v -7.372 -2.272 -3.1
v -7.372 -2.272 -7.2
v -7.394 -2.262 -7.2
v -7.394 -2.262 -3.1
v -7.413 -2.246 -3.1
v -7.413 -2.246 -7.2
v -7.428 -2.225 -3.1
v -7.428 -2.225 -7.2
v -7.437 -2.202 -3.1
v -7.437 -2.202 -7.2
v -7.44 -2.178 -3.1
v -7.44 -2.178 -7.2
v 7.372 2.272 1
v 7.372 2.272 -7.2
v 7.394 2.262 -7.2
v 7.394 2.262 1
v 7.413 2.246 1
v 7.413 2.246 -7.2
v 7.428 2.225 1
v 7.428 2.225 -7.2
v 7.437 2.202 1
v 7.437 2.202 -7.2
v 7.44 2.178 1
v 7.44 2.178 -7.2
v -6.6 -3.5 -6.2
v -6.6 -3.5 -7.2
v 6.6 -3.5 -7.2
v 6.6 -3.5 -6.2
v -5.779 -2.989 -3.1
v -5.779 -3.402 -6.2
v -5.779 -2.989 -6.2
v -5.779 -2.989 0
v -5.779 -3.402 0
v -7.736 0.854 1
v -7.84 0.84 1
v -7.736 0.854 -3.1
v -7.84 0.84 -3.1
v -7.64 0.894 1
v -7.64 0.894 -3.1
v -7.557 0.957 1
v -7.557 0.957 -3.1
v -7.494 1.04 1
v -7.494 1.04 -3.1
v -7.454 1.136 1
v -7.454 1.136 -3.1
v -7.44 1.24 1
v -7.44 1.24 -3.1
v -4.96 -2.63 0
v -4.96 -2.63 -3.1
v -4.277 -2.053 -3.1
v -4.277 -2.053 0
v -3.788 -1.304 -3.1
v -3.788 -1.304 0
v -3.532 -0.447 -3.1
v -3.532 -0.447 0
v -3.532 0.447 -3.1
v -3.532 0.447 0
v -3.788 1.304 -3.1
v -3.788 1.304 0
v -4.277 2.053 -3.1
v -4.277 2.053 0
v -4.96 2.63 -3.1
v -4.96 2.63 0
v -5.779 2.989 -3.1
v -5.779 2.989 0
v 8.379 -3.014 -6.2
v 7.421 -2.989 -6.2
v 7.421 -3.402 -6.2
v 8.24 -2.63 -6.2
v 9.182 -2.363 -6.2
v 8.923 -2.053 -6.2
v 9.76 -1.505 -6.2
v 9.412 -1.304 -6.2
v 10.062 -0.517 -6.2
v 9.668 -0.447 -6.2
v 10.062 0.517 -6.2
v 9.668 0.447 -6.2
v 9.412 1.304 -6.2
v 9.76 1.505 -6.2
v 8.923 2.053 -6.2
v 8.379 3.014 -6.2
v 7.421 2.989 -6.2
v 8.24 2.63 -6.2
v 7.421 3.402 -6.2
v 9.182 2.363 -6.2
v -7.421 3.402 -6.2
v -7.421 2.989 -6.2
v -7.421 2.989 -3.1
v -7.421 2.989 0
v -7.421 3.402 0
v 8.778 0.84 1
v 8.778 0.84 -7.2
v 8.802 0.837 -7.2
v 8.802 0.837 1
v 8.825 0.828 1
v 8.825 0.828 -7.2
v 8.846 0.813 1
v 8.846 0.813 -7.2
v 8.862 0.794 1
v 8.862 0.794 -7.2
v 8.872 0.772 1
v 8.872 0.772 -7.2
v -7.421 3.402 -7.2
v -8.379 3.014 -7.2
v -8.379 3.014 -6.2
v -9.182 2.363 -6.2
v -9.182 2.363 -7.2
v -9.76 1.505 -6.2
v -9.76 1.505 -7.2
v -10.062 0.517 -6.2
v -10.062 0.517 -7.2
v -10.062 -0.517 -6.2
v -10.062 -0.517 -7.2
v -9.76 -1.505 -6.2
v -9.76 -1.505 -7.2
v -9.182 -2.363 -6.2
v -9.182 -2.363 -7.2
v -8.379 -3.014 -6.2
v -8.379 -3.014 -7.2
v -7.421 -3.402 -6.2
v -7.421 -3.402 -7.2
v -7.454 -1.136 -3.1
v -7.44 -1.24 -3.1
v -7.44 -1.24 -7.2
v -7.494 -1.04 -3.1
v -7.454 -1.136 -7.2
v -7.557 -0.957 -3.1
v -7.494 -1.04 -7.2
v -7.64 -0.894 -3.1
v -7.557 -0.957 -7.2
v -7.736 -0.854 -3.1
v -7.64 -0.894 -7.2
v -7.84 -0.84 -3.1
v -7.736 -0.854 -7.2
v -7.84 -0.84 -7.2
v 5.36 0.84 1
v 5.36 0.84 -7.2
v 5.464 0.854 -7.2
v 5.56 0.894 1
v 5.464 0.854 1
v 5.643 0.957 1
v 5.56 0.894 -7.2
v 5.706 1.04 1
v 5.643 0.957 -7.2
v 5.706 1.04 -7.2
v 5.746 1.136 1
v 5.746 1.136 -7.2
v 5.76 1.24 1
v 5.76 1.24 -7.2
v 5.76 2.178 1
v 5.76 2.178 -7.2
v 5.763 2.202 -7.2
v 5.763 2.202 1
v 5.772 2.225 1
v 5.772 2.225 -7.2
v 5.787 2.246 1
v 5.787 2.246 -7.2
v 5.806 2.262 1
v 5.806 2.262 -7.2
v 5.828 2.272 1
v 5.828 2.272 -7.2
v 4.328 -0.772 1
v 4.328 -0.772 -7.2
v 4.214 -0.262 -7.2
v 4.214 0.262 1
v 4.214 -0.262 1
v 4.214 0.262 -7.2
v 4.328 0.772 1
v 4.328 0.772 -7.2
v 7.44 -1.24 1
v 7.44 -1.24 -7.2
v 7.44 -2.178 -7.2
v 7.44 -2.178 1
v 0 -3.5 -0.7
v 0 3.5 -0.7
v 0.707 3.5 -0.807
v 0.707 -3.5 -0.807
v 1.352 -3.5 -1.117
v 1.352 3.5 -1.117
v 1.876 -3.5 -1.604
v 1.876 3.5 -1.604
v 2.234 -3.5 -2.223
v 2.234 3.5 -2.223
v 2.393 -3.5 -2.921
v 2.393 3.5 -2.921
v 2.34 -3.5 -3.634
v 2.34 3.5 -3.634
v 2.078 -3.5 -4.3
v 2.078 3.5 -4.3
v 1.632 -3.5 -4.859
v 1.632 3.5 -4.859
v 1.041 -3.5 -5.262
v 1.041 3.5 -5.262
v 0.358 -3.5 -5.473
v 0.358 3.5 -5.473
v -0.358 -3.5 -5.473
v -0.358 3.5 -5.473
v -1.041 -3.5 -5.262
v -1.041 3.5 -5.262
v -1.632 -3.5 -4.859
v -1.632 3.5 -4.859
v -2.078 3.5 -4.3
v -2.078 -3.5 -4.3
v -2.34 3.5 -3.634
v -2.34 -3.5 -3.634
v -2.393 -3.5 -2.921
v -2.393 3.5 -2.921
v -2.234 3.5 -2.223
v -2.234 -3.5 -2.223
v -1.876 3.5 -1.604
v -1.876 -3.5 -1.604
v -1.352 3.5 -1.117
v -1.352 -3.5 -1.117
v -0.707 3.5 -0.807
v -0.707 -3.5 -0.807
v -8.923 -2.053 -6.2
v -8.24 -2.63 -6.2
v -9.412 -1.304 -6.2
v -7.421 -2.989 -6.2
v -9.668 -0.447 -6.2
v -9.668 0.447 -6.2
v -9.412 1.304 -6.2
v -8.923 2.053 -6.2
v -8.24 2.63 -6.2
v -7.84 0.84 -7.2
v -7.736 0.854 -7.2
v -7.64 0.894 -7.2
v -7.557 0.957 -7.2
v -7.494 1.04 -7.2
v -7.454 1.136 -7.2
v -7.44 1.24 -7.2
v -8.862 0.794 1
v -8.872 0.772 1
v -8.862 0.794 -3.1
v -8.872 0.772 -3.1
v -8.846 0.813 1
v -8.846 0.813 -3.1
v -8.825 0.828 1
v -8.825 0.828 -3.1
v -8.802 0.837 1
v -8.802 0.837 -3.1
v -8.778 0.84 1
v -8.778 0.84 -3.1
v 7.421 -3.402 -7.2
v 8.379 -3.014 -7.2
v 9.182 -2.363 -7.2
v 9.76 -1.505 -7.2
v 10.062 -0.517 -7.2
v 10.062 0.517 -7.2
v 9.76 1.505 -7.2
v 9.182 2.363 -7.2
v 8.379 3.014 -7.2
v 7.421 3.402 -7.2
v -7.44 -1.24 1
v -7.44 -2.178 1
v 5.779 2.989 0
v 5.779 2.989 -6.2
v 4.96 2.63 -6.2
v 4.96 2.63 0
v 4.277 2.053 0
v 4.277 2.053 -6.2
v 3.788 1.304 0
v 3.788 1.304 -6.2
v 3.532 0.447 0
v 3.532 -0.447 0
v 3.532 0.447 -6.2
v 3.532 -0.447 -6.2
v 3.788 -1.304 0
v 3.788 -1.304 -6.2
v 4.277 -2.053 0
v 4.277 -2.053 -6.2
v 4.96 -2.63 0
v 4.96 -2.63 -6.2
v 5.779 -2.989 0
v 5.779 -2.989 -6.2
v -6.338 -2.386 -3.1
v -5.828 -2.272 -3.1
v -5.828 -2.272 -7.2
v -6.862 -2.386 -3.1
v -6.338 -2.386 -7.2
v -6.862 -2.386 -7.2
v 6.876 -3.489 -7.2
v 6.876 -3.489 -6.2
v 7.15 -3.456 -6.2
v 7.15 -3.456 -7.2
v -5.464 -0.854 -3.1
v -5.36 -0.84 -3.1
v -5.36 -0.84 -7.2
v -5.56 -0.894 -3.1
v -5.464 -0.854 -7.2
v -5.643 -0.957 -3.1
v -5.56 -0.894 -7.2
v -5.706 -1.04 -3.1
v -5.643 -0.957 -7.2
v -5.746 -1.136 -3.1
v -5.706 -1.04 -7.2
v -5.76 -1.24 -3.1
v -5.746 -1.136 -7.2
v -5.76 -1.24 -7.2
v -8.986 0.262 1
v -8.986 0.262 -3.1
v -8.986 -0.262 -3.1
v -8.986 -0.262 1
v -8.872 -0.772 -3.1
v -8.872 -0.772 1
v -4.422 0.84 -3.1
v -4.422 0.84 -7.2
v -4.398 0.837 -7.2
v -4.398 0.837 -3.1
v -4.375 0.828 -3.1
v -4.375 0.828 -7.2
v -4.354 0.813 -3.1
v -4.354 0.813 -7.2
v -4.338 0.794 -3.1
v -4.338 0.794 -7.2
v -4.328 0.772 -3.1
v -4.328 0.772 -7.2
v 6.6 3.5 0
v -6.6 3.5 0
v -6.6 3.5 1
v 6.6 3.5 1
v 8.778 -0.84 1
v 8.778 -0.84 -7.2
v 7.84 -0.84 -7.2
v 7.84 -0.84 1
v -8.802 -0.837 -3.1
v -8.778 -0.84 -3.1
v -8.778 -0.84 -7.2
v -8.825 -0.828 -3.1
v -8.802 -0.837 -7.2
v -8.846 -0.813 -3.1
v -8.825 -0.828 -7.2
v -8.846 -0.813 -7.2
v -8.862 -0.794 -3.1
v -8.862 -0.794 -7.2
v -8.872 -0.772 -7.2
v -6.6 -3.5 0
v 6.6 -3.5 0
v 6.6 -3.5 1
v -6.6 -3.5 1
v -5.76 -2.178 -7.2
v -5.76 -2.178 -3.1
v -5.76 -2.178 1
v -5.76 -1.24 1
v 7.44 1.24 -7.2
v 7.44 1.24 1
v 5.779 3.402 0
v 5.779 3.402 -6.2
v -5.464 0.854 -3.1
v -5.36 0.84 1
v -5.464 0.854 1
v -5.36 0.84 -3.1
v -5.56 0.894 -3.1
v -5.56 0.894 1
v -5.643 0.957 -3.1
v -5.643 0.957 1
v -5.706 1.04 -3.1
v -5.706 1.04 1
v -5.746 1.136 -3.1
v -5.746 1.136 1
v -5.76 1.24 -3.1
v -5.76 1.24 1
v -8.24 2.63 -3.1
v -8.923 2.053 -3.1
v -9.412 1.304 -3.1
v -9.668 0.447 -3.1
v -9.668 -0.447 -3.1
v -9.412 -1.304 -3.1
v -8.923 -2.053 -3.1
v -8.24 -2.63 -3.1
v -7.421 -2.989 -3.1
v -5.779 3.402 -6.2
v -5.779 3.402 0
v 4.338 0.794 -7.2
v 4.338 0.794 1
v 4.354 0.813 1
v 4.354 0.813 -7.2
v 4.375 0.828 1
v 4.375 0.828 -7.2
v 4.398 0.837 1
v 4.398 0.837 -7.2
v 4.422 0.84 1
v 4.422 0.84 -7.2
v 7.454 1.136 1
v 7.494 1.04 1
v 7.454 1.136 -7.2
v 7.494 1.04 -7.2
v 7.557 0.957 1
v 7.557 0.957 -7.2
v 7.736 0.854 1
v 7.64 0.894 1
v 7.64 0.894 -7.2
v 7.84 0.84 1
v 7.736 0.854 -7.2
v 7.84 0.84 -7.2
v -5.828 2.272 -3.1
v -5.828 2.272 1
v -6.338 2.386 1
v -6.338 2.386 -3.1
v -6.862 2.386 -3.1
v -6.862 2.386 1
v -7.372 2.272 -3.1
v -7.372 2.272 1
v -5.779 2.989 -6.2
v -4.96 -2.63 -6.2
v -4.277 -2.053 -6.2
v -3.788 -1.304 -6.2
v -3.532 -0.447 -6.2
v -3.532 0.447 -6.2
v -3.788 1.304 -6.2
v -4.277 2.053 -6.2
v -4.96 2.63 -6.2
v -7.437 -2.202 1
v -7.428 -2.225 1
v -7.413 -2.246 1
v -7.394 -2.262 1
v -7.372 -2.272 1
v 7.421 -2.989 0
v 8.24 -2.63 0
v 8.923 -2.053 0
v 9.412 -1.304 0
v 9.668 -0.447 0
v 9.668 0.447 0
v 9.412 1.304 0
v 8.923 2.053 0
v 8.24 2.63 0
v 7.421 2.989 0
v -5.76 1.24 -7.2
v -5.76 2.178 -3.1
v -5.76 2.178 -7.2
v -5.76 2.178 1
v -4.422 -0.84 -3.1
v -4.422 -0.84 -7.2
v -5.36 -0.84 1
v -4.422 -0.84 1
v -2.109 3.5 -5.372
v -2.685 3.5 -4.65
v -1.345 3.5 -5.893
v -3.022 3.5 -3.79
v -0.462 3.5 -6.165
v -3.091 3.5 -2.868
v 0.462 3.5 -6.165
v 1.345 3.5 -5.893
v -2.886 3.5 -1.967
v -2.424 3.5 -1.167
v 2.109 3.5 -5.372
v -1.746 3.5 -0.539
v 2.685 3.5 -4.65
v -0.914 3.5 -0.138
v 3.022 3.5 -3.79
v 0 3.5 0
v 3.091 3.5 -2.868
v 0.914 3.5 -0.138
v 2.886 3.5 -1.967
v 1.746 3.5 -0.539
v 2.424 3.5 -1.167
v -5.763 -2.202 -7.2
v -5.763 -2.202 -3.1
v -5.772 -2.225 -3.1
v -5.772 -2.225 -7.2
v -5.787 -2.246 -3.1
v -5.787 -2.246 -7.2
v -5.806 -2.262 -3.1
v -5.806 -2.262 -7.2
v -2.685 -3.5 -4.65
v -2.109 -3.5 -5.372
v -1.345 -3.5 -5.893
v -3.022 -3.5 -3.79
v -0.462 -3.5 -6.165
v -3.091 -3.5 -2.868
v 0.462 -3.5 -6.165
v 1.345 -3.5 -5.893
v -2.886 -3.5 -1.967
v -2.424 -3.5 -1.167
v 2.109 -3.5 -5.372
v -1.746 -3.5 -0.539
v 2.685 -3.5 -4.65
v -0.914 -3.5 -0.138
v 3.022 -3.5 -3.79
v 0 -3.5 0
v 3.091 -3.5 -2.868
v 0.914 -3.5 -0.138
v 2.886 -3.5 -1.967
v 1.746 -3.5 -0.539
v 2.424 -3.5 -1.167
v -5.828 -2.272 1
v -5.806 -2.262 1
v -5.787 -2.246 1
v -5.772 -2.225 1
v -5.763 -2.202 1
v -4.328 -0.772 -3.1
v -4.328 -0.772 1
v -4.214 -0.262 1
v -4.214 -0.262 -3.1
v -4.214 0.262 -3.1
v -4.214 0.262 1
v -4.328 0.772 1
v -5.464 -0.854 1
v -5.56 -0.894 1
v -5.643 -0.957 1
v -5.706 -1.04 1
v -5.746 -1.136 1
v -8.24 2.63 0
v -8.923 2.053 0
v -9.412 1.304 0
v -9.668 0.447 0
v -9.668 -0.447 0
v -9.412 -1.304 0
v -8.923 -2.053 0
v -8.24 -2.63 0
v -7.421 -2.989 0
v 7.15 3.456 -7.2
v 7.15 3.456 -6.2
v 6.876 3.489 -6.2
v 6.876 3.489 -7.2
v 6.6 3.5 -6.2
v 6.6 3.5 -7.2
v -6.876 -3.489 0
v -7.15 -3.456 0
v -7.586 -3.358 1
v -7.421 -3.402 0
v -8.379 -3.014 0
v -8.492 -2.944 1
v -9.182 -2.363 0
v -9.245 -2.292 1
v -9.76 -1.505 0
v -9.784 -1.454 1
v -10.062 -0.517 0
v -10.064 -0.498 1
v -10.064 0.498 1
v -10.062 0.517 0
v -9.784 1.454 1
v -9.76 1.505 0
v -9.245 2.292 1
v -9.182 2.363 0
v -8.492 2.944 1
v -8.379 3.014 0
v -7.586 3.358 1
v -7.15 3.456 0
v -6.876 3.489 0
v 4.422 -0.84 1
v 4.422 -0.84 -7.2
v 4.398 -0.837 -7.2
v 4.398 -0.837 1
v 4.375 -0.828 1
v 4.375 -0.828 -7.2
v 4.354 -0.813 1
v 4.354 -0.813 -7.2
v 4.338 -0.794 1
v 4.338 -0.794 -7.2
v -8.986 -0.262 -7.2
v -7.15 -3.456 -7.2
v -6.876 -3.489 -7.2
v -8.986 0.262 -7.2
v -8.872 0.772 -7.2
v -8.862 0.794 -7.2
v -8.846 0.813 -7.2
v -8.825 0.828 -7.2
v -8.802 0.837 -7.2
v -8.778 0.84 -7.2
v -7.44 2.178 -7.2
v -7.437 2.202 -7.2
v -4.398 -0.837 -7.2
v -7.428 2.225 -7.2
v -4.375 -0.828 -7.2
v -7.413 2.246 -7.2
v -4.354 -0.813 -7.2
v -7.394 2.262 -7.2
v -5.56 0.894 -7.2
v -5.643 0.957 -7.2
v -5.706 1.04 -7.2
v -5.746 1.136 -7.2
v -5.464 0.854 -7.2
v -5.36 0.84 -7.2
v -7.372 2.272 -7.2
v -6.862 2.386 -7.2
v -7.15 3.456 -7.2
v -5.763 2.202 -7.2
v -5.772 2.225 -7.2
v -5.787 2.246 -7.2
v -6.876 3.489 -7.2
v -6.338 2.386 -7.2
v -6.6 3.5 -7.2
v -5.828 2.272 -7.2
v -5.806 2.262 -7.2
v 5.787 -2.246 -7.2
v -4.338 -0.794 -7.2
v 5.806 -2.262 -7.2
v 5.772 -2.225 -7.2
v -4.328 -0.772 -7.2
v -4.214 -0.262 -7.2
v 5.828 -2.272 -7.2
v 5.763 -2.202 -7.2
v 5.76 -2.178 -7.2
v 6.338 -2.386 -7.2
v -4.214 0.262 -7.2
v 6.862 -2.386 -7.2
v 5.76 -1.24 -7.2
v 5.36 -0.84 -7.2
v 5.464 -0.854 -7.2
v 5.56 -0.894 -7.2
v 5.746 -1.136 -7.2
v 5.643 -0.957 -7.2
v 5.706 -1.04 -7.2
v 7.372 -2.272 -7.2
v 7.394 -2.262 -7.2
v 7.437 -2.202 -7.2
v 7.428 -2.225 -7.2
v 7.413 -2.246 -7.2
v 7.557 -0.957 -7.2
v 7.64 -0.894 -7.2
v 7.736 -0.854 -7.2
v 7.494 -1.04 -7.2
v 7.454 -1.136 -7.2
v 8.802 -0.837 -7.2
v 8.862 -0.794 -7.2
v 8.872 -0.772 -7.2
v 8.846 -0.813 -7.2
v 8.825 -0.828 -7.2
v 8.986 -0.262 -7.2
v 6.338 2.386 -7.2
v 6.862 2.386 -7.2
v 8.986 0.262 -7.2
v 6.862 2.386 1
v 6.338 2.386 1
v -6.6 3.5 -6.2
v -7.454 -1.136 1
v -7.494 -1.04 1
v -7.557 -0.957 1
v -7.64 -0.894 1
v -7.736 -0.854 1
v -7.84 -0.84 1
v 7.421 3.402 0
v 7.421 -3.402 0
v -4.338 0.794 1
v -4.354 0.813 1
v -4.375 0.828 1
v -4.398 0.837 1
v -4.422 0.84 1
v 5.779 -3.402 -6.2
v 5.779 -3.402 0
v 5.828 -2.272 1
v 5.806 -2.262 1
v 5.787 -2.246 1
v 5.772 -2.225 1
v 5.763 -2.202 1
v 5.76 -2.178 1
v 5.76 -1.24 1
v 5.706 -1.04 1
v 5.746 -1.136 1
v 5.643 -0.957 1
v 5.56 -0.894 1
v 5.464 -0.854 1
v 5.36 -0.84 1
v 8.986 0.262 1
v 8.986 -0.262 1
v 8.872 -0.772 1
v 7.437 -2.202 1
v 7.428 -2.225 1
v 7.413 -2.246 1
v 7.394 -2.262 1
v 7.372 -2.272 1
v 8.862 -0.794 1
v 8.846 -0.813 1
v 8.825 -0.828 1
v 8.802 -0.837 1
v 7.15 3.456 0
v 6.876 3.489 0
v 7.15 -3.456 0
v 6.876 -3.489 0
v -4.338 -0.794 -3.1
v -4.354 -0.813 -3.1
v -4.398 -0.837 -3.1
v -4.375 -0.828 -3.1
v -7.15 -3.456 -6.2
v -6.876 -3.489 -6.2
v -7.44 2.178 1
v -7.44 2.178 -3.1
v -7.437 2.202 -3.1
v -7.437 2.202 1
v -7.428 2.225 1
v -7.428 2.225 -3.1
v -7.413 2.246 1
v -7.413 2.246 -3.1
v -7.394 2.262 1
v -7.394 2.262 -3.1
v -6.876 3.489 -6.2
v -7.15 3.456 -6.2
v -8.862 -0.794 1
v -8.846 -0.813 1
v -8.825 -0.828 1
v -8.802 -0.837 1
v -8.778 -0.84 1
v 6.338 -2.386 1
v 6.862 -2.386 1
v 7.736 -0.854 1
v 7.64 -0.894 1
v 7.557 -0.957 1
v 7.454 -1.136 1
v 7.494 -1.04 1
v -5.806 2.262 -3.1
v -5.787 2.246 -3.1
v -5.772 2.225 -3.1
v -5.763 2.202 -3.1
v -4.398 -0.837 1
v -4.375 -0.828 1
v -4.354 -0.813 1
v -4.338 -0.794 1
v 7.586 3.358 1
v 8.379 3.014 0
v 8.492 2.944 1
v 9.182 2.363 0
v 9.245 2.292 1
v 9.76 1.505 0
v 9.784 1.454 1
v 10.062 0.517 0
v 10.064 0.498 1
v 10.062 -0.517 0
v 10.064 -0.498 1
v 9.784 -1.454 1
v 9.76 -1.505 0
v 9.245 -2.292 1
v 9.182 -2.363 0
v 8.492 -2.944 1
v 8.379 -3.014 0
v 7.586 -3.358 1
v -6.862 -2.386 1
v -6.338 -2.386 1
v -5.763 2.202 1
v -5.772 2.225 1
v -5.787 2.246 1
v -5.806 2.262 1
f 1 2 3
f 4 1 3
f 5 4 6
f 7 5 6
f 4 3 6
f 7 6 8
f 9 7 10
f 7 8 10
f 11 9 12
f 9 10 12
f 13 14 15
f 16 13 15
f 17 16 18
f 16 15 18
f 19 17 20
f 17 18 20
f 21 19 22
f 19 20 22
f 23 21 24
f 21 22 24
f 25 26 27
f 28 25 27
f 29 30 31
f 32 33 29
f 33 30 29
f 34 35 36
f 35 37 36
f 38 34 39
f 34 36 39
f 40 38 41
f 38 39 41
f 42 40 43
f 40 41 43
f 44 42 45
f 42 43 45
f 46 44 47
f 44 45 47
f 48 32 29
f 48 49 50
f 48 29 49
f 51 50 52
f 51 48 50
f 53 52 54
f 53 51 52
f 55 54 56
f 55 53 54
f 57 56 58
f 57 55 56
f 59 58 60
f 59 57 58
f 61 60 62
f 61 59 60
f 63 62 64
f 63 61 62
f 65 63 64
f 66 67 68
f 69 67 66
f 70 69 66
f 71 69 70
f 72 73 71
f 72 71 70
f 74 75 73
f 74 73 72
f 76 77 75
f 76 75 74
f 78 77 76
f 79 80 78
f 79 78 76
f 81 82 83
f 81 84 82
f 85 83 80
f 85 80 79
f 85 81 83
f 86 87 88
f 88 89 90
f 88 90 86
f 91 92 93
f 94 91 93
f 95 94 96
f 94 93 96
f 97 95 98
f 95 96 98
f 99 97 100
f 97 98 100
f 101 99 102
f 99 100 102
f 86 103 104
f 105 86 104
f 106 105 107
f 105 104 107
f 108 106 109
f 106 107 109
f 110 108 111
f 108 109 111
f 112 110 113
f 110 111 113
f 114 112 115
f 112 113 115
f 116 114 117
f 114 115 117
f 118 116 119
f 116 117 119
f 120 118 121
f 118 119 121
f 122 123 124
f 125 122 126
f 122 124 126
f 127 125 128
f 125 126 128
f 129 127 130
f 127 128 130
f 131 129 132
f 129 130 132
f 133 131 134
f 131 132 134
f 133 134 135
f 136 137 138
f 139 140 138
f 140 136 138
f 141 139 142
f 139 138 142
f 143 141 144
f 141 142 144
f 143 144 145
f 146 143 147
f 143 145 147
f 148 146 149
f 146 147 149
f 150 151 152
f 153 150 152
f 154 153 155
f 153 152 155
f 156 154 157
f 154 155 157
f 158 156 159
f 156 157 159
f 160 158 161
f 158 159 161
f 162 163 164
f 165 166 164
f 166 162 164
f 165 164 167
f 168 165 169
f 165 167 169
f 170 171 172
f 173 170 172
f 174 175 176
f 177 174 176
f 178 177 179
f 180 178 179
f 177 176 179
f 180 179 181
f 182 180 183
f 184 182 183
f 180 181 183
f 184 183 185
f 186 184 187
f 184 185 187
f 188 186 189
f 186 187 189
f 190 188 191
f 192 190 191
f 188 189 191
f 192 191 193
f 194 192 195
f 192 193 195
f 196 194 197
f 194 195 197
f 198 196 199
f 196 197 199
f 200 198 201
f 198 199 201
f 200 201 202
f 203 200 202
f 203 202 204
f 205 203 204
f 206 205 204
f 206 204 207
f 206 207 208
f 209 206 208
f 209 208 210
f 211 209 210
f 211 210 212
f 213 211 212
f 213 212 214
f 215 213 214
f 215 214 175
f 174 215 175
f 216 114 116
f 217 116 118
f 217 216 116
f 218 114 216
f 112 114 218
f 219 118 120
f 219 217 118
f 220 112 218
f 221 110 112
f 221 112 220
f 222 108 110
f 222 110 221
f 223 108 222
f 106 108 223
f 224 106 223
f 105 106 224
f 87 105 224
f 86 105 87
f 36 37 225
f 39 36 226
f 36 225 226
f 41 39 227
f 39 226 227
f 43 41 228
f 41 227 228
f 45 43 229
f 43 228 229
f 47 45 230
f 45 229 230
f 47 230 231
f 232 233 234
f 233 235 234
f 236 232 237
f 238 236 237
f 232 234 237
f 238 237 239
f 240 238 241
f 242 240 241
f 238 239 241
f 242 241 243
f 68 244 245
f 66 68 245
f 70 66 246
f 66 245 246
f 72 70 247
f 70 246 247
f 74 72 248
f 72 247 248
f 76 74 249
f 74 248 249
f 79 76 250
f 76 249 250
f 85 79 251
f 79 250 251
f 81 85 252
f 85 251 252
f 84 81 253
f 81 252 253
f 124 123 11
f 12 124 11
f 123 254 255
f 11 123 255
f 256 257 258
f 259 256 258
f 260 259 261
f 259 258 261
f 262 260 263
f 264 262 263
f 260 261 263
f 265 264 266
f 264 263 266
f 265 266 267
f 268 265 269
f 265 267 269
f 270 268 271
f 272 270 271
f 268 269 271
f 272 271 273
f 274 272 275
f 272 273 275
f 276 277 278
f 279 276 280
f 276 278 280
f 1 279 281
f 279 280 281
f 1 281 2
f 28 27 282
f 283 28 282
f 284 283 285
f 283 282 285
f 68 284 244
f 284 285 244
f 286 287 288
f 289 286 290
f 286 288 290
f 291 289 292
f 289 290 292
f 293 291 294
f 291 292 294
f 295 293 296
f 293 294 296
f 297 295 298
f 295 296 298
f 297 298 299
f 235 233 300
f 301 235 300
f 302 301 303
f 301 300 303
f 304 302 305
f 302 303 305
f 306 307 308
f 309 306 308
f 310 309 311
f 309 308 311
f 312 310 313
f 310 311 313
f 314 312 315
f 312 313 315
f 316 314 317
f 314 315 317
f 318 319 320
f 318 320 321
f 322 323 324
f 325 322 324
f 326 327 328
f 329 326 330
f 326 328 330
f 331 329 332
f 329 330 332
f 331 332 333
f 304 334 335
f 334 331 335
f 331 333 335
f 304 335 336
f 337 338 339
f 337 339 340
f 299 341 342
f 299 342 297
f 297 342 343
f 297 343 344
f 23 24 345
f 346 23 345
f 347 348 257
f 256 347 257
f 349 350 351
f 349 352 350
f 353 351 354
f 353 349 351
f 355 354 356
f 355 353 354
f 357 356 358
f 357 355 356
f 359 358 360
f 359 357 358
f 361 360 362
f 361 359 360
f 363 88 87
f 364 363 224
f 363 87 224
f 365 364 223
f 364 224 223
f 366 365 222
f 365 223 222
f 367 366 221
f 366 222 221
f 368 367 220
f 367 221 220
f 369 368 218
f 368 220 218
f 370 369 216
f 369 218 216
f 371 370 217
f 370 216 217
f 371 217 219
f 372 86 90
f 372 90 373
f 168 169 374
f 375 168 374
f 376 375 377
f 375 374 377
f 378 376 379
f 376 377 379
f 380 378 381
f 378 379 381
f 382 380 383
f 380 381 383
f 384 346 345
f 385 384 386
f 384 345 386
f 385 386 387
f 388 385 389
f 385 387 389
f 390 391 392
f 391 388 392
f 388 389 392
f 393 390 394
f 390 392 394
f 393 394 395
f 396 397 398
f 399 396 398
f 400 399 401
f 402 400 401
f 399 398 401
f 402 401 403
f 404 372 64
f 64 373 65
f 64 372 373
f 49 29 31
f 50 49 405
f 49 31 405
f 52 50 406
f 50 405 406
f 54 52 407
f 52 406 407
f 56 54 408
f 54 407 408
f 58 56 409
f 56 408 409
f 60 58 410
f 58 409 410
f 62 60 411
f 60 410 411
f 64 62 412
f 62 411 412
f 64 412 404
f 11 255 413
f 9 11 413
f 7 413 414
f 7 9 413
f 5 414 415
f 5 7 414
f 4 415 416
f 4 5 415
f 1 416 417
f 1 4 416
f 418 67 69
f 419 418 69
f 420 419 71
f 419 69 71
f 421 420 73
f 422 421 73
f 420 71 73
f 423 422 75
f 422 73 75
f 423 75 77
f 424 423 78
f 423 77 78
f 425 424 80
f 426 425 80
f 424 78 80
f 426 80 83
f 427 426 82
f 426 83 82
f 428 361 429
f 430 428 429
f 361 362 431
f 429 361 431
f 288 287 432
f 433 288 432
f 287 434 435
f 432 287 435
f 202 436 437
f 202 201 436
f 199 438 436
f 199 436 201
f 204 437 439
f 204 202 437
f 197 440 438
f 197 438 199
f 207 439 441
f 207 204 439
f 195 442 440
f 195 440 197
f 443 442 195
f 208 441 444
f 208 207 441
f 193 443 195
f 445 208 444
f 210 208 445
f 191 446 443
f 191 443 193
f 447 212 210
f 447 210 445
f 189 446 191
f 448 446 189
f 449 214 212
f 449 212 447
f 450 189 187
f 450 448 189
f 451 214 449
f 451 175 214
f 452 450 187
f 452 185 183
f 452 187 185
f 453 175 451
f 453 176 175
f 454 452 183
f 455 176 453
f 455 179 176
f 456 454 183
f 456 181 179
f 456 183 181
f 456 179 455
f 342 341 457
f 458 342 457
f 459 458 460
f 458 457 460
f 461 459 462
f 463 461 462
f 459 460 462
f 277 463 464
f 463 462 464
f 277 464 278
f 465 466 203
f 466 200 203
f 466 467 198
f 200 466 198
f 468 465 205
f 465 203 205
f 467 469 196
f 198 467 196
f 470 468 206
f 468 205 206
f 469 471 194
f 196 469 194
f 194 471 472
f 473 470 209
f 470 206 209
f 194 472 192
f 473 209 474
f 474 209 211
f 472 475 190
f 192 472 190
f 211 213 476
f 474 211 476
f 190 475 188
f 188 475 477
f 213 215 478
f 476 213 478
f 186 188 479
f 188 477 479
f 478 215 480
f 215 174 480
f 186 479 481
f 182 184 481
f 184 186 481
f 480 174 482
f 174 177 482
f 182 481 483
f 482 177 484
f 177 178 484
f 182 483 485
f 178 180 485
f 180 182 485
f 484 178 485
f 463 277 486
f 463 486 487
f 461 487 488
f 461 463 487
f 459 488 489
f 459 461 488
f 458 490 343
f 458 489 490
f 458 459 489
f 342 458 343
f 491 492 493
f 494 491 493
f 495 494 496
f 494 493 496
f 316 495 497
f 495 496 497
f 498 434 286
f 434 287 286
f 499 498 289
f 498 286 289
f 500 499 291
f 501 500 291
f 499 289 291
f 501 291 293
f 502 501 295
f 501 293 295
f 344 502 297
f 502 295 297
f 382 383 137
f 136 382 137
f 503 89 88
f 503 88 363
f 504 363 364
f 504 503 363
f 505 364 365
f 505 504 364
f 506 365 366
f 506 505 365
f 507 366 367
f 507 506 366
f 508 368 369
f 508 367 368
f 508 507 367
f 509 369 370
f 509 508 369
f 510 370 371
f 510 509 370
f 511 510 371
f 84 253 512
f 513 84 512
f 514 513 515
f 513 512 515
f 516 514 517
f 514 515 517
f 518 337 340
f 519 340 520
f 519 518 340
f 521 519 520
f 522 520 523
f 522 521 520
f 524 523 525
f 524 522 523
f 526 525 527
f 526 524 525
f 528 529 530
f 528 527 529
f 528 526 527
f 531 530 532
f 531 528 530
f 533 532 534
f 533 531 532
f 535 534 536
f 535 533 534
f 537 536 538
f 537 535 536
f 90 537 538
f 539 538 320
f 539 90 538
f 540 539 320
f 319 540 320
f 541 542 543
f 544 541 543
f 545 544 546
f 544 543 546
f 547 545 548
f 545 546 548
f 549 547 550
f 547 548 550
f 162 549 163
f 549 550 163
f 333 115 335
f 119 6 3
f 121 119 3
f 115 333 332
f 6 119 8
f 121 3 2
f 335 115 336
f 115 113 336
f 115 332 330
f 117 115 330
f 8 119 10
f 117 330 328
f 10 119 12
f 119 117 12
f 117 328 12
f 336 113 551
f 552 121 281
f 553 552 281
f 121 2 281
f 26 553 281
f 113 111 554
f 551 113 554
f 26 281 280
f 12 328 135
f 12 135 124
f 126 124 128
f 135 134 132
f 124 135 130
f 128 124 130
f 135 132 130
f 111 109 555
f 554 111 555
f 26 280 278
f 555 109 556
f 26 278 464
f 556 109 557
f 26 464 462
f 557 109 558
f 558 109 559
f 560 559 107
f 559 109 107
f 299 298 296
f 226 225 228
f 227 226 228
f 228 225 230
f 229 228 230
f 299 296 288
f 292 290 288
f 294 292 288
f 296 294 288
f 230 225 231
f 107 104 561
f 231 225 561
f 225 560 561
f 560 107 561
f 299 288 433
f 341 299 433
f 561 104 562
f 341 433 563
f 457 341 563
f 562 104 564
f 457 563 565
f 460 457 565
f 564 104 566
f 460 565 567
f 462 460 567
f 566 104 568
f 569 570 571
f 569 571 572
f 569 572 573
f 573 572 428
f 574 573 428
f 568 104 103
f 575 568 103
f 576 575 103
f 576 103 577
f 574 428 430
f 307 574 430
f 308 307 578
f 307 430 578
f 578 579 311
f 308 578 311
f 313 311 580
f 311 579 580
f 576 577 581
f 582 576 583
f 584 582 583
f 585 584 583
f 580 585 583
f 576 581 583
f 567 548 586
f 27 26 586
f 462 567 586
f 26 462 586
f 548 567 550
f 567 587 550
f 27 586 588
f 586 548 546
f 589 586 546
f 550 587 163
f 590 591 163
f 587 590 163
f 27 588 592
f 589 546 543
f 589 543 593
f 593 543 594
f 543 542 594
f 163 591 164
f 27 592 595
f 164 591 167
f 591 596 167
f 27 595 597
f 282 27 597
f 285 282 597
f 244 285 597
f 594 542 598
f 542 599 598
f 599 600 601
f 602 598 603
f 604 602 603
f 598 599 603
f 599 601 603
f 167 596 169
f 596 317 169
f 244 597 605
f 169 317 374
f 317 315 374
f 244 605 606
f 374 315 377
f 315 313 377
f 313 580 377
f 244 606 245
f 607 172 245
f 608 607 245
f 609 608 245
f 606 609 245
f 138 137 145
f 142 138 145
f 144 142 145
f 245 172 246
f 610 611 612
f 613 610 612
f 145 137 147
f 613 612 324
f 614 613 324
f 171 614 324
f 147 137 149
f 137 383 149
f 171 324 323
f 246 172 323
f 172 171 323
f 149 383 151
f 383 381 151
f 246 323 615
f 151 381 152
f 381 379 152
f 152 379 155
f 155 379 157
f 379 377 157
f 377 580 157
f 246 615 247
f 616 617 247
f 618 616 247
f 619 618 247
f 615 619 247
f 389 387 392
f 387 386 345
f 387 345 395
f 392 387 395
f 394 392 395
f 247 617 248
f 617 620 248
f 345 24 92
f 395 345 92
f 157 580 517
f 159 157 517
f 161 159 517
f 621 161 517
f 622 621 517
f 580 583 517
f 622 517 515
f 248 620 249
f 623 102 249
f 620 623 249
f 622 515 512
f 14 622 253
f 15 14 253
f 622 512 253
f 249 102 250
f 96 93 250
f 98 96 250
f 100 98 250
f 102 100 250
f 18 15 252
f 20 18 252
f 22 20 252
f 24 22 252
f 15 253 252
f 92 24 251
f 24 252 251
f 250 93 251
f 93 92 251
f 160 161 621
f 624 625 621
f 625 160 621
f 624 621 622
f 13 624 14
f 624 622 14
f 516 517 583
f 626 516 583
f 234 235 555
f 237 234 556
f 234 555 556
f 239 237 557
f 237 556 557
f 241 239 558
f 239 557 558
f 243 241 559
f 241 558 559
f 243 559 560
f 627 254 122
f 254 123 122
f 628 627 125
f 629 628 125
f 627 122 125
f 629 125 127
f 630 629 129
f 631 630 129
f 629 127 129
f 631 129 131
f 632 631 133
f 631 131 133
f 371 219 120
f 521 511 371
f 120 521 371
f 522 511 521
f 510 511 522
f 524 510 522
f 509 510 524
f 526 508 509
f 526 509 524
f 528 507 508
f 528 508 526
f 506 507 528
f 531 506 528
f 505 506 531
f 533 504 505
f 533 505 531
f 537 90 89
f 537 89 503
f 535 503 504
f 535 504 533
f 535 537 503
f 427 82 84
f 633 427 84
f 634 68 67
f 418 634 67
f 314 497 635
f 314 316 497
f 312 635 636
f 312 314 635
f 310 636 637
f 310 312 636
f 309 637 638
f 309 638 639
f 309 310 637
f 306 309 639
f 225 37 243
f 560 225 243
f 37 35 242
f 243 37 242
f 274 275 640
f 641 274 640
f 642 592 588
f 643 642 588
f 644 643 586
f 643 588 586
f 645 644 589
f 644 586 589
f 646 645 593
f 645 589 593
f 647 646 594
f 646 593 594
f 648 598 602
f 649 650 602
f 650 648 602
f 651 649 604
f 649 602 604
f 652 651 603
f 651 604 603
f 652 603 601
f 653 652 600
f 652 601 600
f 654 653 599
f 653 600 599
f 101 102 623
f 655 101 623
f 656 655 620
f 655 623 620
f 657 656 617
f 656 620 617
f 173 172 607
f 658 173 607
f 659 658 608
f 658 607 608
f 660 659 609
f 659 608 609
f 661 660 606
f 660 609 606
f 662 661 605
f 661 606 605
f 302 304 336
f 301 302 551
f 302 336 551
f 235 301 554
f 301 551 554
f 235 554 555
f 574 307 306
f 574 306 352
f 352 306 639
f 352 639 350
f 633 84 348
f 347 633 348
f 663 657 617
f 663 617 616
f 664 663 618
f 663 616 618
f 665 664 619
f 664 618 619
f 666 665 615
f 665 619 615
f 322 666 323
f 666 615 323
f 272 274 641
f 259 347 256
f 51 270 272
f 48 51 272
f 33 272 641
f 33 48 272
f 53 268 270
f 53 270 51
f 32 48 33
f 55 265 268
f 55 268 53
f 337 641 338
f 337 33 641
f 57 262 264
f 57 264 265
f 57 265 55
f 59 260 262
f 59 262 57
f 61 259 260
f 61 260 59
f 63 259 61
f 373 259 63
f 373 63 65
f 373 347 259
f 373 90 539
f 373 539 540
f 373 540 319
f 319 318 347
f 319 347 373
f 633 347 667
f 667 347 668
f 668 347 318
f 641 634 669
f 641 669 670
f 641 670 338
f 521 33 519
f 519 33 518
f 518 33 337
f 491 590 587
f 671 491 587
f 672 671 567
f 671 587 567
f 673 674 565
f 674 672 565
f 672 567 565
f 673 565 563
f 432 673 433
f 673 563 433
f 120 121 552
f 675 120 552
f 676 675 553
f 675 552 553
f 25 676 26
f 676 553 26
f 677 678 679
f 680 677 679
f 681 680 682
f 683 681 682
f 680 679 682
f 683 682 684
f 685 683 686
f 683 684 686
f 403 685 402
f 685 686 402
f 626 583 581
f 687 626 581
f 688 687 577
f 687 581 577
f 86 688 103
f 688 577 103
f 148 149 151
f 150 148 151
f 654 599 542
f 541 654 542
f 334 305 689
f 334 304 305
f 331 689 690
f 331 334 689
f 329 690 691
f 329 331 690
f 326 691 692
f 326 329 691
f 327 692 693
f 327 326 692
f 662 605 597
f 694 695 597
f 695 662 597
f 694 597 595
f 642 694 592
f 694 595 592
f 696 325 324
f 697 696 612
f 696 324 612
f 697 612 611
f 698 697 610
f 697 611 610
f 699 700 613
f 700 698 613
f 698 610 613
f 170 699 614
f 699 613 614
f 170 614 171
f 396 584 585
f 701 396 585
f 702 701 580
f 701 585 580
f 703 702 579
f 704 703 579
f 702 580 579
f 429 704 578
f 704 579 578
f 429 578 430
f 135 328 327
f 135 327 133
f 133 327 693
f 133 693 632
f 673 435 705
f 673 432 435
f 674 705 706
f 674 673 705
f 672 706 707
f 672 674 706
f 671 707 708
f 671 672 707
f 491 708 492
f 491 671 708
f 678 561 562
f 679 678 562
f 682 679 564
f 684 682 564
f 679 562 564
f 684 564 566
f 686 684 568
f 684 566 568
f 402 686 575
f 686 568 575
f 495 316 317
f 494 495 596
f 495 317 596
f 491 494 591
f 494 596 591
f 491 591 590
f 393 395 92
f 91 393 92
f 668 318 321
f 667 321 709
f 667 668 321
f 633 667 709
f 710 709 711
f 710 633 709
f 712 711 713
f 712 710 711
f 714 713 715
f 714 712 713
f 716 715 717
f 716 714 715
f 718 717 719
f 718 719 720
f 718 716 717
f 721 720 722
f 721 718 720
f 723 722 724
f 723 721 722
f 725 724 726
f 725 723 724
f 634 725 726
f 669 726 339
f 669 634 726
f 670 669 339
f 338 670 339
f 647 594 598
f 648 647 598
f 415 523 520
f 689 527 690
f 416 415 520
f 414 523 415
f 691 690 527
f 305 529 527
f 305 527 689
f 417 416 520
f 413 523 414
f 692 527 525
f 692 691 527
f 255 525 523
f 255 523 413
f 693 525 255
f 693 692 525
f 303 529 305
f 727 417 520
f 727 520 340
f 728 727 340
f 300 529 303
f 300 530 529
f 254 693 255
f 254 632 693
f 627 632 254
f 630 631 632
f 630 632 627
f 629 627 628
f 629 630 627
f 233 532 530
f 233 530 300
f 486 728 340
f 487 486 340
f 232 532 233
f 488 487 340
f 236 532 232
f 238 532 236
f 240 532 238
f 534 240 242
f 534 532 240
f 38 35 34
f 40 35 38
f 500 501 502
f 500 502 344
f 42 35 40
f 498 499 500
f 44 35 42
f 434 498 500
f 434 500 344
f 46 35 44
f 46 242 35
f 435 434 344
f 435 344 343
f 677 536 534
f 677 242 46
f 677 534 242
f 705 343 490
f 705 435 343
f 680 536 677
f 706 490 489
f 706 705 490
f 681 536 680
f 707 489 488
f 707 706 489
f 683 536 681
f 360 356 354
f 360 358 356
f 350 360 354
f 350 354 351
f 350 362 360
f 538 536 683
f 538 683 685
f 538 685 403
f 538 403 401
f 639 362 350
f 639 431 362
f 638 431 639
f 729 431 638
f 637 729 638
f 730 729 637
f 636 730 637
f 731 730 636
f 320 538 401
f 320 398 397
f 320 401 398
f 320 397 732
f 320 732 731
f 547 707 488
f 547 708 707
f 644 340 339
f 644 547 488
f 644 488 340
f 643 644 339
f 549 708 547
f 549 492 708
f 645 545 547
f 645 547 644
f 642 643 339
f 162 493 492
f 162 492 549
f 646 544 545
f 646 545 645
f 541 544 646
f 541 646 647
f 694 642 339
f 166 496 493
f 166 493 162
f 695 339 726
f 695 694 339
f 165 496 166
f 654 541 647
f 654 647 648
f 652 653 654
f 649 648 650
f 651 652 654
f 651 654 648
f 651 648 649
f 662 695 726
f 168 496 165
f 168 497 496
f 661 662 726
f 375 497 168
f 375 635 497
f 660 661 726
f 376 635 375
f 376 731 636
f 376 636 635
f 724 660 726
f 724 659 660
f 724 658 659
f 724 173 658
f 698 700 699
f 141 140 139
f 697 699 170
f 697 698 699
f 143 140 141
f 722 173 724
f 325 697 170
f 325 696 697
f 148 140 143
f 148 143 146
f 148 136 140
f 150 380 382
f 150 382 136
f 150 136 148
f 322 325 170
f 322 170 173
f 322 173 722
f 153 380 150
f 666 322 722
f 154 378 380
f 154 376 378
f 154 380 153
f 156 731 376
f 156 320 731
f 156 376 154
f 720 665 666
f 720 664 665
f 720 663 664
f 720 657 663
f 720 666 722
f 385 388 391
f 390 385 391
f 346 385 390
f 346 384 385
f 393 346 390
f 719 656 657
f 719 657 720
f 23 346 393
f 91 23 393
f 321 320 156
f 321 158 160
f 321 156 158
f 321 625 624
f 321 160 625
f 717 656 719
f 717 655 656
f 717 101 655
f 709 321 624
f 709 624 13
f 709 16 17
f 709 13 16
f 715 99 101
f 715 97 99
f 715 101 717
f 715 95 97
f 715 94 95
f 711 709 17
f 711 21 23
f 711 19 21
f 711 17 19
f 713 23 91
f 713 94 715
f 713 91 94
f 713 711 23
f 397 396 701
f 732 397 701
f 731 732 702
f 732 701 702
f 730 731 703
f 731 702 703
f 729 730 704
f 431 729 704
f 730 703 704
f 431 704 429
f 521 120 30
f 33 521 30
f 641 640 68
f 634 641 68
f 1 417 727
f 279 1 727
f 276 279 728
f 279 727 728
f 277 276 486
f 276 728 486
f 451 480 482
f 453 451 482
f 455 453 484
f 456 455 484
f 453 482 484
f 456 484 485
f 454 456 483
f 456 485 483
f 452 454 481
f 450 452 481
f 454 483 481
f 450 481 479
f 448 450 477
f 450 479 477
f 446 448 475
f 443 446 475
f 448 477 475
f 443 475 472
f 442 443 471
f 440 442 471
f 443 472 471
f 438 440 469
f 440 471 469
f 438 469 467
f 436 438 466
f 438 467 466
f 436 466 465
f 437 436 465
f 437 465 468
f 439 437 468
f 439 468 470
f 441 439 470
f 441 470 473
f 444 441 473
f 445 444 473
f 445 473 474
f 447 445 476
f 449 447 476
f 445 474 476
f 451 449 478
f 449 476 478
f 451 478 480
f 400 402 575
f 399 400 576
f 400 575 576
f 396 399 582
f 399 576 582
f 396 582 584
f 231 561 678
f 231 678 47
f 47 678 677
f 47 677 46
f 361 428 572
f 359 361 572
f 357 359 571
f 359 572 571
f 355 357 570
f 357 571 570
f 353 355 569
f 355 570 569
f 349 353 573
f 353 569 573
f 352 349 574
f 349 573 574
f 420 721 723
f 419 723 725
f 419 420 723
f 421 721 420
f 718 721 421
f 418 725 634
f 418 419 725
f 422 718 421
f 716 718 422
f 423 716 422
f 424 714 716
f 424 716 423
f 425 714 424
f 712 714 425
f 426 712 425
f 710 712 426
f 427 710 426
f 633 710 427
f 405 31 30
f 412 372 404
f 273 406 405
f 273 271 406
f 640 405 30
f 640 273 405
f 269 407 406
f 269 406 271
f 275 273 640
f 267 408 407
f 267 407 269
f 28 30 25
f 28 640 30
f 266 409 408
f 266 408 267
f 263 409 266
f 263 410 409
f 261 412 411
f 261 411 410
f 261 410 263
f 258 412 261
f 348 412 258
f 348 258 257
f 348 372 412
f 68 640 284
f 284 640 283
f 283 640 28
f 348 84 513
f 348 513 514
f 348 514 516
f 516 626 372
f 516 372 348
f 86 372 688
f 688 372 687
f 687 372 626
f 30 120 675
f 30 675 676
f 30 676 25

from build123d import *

# Parameters (mm, degrees)
BOSS_EXTRUDE1_DEPTH      = 10
BOSS_EXTRUDE2_DEPTH      = 35
BOSS_EXTRUDE2_DEPTH_BACK = 35
SKETCH2_R                = 31
SKETCH3_R                = 31
BOSS_EXTRUDE3_DEPTH      = 41
CUT_EXTRUDE1_DEPTH       = 41
FILLET1_R                = 4
FILLET2_R                = 4
FILLET3_R                = 4
FILLET4_R                = 4
FILLET5_R                = 1
FILLET6_R                = 1
FILLET7_R                = 1
FILLET8_R                = 1
FILLET9_R                = 1
FILLET10_R               = 1
FILLET11_R               = 1
FILLET12_R               = 1
BOSS_EXTRUDE4_DEPTH      = 41
MIRROR2_DEPTH            = 10
MIRROR2_START            = -31
MIRROR2_2_DEPTH          = 31
SKETCH6_R                = 24
CUT_EXTRUDE2_DEPTH       = 138.640836963
MIRROR3_START            = -72
MIRROR3_DEPTH            = 41
MIRROR3_2_DEPTH          = 10
SCALE1_SCALE             = 0.1


# Read off the part's stored shape, not the designer's step: Mirror2, Mirror3
with BuildPart() as part:
    # Sketch1 → Boss-Extrude1 (new body)
    with BuildSketch(Plane.XY):
        with BuildLine():
            Line((-66, 35), (66, 35))
            ThreePointArc((66, 35), (101, 0), (66, -35))
            Line((66, -35), (-66, -35))
            ThreePointArc((-66, -35), (-101, 0), (-66, 35))
        make_face()
    extrude(amount=BOSS_EXTRUDE1_DEPTH)

    # Sketch3 → Boss-Extrude3 (add)
    with BuildSketch(Plane.XY.offset(10)):
        with Locations((-66, 0)):
            Circle(SKETCH3_R)
    extrude(amount=-BOSS_EXTRUDE3_DEPTH)

    # Sketch4 → Cut-Extrude1 (cut)
    with BuildSketch(Plane.XY.offset(10)):
        with BuildLine():
            Line((-57.6, -8.4), (-43.518007206, -8.4))
            ThreePointArc((-43.518007206, -8.4), (-42, 0), (-43.518007206, 8.4))
            Line((-43.518007206, 8.4), (-57.6, 8.4))
            Line((-57.6, 8.4), (-57.6, 22.481992794))
            ThreePointArc((-57.6, 22.481992794), (-66, 24), (-74.4, 22.481992794))
            Line((-74.4, 22.481992794), (-74.4, 8.4))
            Line((-74.4, 8.4), (-88.481992794, 8.4))
            ThreePointArc((-88.481992794, 8.4), (-90, 0), (-88.481992794, -8.4))
            Line((-88.481992794, -8.4), (-74.4, -8.4))
            Line((-74.4, -8.4), (-74.4, -22.481992794))
            ThreePointArc((-74.4, -22.481992794), (-66, -24), (-57.6, -22.481992794))
            Line((-57.6, -22.481992794), (-57.6, -8.4))
        make_face()
    extrude(amount=-CUT_EXTRUDE1_DEPTH, mode=Mode.SUBTRACT)

    # Fillet1
    fillet1_edges = [part.edges().sort_by_distance(p)[0] for p in [
        (-57.6, 8.4, -10.5),
    ]]
    fillet(fillet1_edges, radius=FILLET1_R)

    # Fillet2
    fillet2_edges = [part.edges().sort_by_distance(p)[0] for p in [
        (-57.6, -8.4, -10.5),
    ]]
    fillet(fillet2_edges, radius=FILLET2_R)

    # Fillet3
    fillet3_edges = [part.edges().sort_by_distance(p)[0] for p in [
        (-74.4, -8.4, -10.5),
    ]]
    fillet(fillet3_edges, radius=FILLET3_R)

    # Fillet4
    fillet4_edges = [part.edges().sort_by_distance(p)[0] for p in [
        (-74.4, 8.4, -10.5),
    ]]
    fillet(fillet4_edges, radius=FILLET4_R)

    # Fillet5
    fillet5_edges = [part.edges().sort_by_distance(p)[0] for p in [
        (-74.4, -22.481992794, -10.5),
    ]]
    fillet(fillet5_edges, radius=FILLET5_R)

    # Fillet6
    fillet6_edges = [part.edges().sort_by_distance(p)[0] for p in [
        (-57.6, -22.481992794, -10.5),
    ]]
    fillet(fillet6_edges, radius=FILLET6_R)

    # Fillet7
    fillet7_edges = [part.edges().sort_by_distance(p)[0] for p in [
        (-43.518007206, -8.4, -10.5),
    ]]
    fillet(fillet7_edges, radius=FILLET7_R)

    # Fillet8
    fillet8_edges = [part.edges().sort_by_distance(p)[0] for p in [
        (-43.518007206, 8.4, -10.5),
    ]]
    fillet(fillet8_edges, radius=FILLET8_R)

    # Fillet9
    fillet9_edges = [part.edges().sort_by_distance(p)[0] for p in [
        (-88.481992794, -8.4, -10.5),
    ]]
    fillet(fillet9_edges, radius=FILLET9_R)

    # Fillet10
    fillet10_edges = [part.edges().sort_by_distance(p)[0] for p in [
        (-88.481992794, 8.4, -10.5),
    ]]
    fillet(fillet10_edges, radius=FILLET10_R)

    # Fillet11
    fillet11_edges = [part.edges().sort_by_distance(p)[0] for p in [
        (-74.4, 22.481992794, -10.5),
    ]]
    fillet(fillet11_edges, radius=FILLET11_R)

    # Fillet12
    fillet12_edges = [part.edges().sort_by_distance(p)[0] for p in [
        (-57.6, 22.481992794, -10.5),
    ]]
    fillet(fillet12_edges, radius=FILLET12_R)

    # Sketch5 → Boss-Extrude4 (add)
    with BuildSketch(Plane.XY.offset(10)):
        with BuildLine():
            Line((-74.212938845, 22.359401208), (-74.212938845, 34.022751734))
            Line((-74.212938845, 34.022751734), (-57.787061155, 34.022751734))
            Line((-57.787061155, 34.022751734), (-57.787061155, 22.359401208))
            ThreePointArc((-57.787061155, 22.359401208), (-58.004110065, 22.580118257), (-58.27826087, 22.723880496))
            ThreePointArc((-58.27826087, 22.723880496), (-66, 24), (-73.72173913, 22.723880496))
            ThreePointArc((-73.72173913, 22.723880496), (-73.995889935, 22.580118257), (-74.212938845, 22.359401208))
        make_face()
    boss_extrude4 = extrude(amount=-BOSS_EXTRUDE4_DEPTH)

    # Mirror1: Boss-Extrude4 across plane
    add(boss_extrude4.mirror(Plane.ZX))

    # Mirror2 outline → Mirror2 (cut)
    with BuildSketch(Plane.XY):
        with BuildLine():
            Line((44.222947858, -8.4), (53.6, -8.4))
            ThreePointArc((53.6, -8.4), (56.428427125, -9.571572875), (57.6, -12.4))
            Line((57.6, -12.4), (57.6, -21.777052142))
            ThreePointArc((57.6, -21.777052142), (57.787061155, -22.359401208), (58.27826087, -22.723880496))
            ThreePointArc((58.27826087, -22.723880496), (66, -24), (73.72173913, -22.723880496))
            ThreePointArc((73.72173913, -22.723880496), (74.212938845, -22.359401208), (74.4, -21.777052142))
            Line((74.4, -21.777052142), (74.4, -12.4))
            ThreePointArc((74.4, -12.4), (75.571572875, -9.571572875), (78.4, -8.4))
            Line((78.4, -8.4), (87.777052142, -8.4))
            ThreePointArc((87.777052142, -8.4), (88.359401208, -8.212938845), (88.723880496, -7.72173913))
            ThreePointArc((88.723880496, -7.72173913), (90, 0), (88.723880496, 7.72173913))
            ThreePointArc((88.723880496, 7.72173913), (88.359401208, 8.212938845), (87.777052142, 8.4))
            Line((87.777052142, 8.4), (78.4, 8.4))
            ThreePointArc((78.4, 8.4), (75.571572875, 9.571572875), (74.4, 12.4))
            Line((74.4, 12.4), (74.4, 21.777052142))
            ThreePointArc((74.4, 21.777052142), (74.212938845, 22.359401208), (73.72173913, 22.723880496))
            ThreePointArc((73.72173913, 22.723880496), (66, 24), (58.27826087, 22.723880496))
            ThreePointArc((58.27826087, 22.723880496), (57.787061155, 22.359401208), (57.6, 21.777052142))
            Line((57.6, 21.777052142), (57.6, 12.4))
            ThreePointArc((57.6, 12.4), (56.428427125, 9.571572875), (53.6, 8.4))
            Line((53.6, 8.4), (44.222947858, 8.4))
            ThreePointArc((44.222947858, 8.4), (43.640598792, 8.212938845), (43.276119504, 7.72173913))
            ThreePointArc((43.276119504, 7.72173913), (42, 0), (43.276119504, -7.72173913))
            ThreePointArc((43.276119504, -7.72173913), (43.640598792, -8.212938845), (44.222947858, -8.4))
        make_face()
    extrude(amount=MIRROR2_DEPTH, mode=Mode.SUBTRACT)

    # Mirror2 2 outline → Mirror2 2 (add)
    with BuildSketch(Plane.XY.offset(MIRROR2_START)):
        with BuildLine():
            Line((74.212938845, -34.022751734), (74.212938845, -29.892267153))
            ThreePointArc((74.212938845, -29.892267153), (97, 0), (74.212938845, 29.892267153))
            Line((74.212938845, 29.892267153), (74.212938845, 34.022751734))
            Line((74.212938845, 34.022751734), (57.787061155, 34.022751734))
            Line((57.787061155, 34.022751734), (57.787061155, 29.892267153))
            ThreePointArc((57.787061155, 29.892267153), (35, 0), (57.787061155, -29.892267153))
            Line((57.787061155, -29.892267153), (57.787061155, -34.022751734))
            Line((57.787061155, -34.022751734), (74.212938845, -34.022751734))
        make_face()
        with BuildLine():
            ThreePointArc((57.6, -12.4), (56.428427125, -9.571572875), (53.6, -8.4))
            Line((53.6, -8.4), (44.222947858, -8.4))
            ThreePointArc((44.222947858, -8.4), (43.640598792, -8.212938845), (43.276119504, -7.72173913))
            ThreePointArc((43.276119504, -7.72173913), (42, 0), (43.276119504, 7.72173913))
            ThreePointArc((43.276119504, 7.72173913), (43.640598792, 8.212938845), (44.222947858, 8.4))
            Line((44.222947858, 8.4), (53.6, 8.4))
            ThreePointArc((53.6, 8.4), (56.428427125, 9.571572875), (57.6, 12.4))
            Line((57.6, 12.4), (57.6, 21.777052142))
            ThreePointArc((57.6, 21.777052142), (57.787061155, 22.359401208), (58.27826087, 22.723880496))
            ThreePointArc((58.27826087, 22.723880496), (66, 24), (73.72173913, 22.723880496))
            ThreePointArc((73.72173913, 22.723880496), (74.212938845, 22.359401208), (74.4, 21.777052142))
            Line((74.4, 21.777052142), (74.4, 12.4))
            ThreePointArc((74.4, 12.4), (75.571572875, 9.571572875), (78.4, 8.4))
            Line((78.4, 8.4), (87.777052142, 8.4))
            ThreePointArc((87.777052142, 8.4), (88.359401208, 8.212938845), (88.723880496, 7.72173913))
            ThreePointArc((88.723880496, 7.72173913), (90, 0), (88.723880496, -7.72173913))
            ThreePointArc((88.723880496, -7.72173913), (88.359401208, -8.212938845), (87.777052142, -8.4))
            Line((87.777052142, -8.4), (78.4, -8.4))
            ThreePointArc((78.4, -8.4), (75.571572875, -9.571572875), (74.4, -12.4))
            Line((74.4, -12.4), (74.4, -21.777052142))
            ThreePointArc((74.4, -21.777052142), (74.212938845, -22.359401208), (73.72173913, -22.723880496))
            ThreePointArc((73.72173913, -22.723880496), (66, -24), (58.27826087, -22.723880496))
            ThreePointArc((58.27826087, -22.723880496), (57.787061155, -22.359401208), (57.6, -21.777052142))
            Line((57.6, -21.777052142), (57.6, -12.4))
        make_face(mode=Mode.SUBTRACT)
    extrude(amount=MIRROR2_2_DEPTH)

    # Mirror3 outline → Mirror3 (add)
    # profile 1 of 2: a face of its own
    with BuildSketch(Plane.XY.offset(MIRROR3_START)):
        with BuildLine():
            Line((74.212938845, -34.022751734), (74.212938845, -29.892267153))
            ThreePointArc((74.212938845, -29.892267153), (97, 0), (74.212938845, 29.892267153))
            Line((74.212938845, 29.892267153), (74.212938845, 34.022751734))
            Line((74.212938845, 34.022751734), (57.787061155, 34.022751734))
            Line((57.787061155, 34.022751734), (57.787061155, 29.892267153))
            ThreePointArc((57.787061155, 29.892267153), (35, 0), (57.787061155, -29.892267153))
            Line((57.787061155, -29.892267153), (57.787061155, -34.022751734))
            Line((57.787061155, -34.022751734), (74.212938845, -34.022751734))
        make_face()
        with BuildLine():
            ThreePointArc((57.6, -12.4), (56.428427125, -9.571572875), (53.6, -8.4))
            Line((53.6, -8.4), (44.222947858, -8.4))
            ThreePointArc((44.222947858, -8.4), (43.640598792, -8.212938845), (43.276119504, -7.72173913))
            ThreePointArc((43.276119504, -7.72173913), (42, 0), (43.276119504, 7.72173913))
            ThreePointArc((43.276119504, 7.72173913), (43.640598792, 8.212938845), (44.222947858, 8.4))
            Line((44.222947858, 8.4), (53.6, 8.4))
            ThreePointArc((53.6, 8.4), (56.428427125, 9.571572875), (57.6, 12.4))
            Line((57.6, 12.4), (57.6, 21.777052142))
            ThreePointArc((57.6, 21.777052142), (57.787061155, 22.359401208), (58.27826087, 22.723880496))
            ThreePointArc((58.27826087, 22.723880496), (66, 24), (73.72173913, 22.723880496))
            ThreePointArc((73.72173913, 22.723880496), (74.212938845, 22.359401208), (74.4, 21.777052142))
            Line((74.4, 21.777052142), (74.4, 12.4))
            ThreePointArc((74.4, 12.4), (75.571572875, 9.571572875), (78.4, 8.4))
            Line((78.4, 8.4), (87.777052142, 8.4))
            ThreePointArc((87.777052142, 8.4), (88.359401208, 8.212938845), (88.723880496, 7.72173913))
            ThreePointArc((88.723880496, 7.72173913), (90, 0), (88.723880496, -7.72173913))
            ThreePointArc((88.723880496, -7.72173913), (88.359401208, -8.212938845), (87.777052142, -8.4))
            Line((87.777052142, -8.4), (78.4, -8.4))
            ThreePointArc((78.4, -8.4), (75.571572875, -9.571572875), (74.4, -12.4))
            Line((74.4, -12.4), (74.4, -21.777052142))
            ThreePointArc((74.4, -21.777052142), (74.212938845, -22.359401208), (73.72173913, -22.723880496))
            ThreePointArc((73.72173913, -22.723880496), (66, -24), (58.27826087, -22.723880496))
            ThreePointArc((58.27826087, -22.723880496), (57.787061155, -22.359401208), (57.6, -21.777052142))
            Line((57.6, -21.777052142), (57.6, -12.4))
        make_face(mode=Mode.SUBTRACT)
    # profile 2 of 2: a face of its own
    with BuildSketch(Plane.XY.offset(MIRROR3_START)):
        with BuildLine():
            Line((-74.212938845, -29.892267153), (-74.212938845, -34.022751734))
            Line((-74.212938845, -34.022751734), (-57.787061155, -34.022751734))
            Line((-57.787061155, -34.022751734), (-57.787061155, -29.892267153))
            ThreePointArc((-57.787061155, -29.892267153), (-35, 0), (-57.787061155, 29.892267153))
            Line((-57.787061155, 29.892267153), (-57.787061155, 34.022751734))
            Line((-57.787061155, 34.022751734), (-74.212938845, 34.022751734))
            Line((-74.212938845, 34.022751734), (-74.212938845, 29.892267153))
            ThreePointArc((-74.212938845, 29.892267153), (-97, 0), (-74.212938845, -29.892267153))
        make_face()
        with BuildLine():
            ThreePointArc((-58.27826087, -22.723880496), (-66, -24), (-73.72173913, -22.723880496))
            ThreePointArc((-73.72173913, -22.723880496), (-74.212938845, -22.359401208), (-74.4, -21.777052142))
            Line((-74.4, -21.777052142), (-74.4, -12.4))
            ThreePointArc((-74.4, -12.4), (-75.571572875, -9.571572875), (-78.4, -8.4))
            Line((-78.4, -8.4), (-87.777052142, -8.4))
            ThreePointArc((-87.777052142, -8.4), (-88.359401208, -8.212938845), (-88.723880496, -7.72173913))
            ThreePointArc((-88.723880496, -7.72173913), (-90, 0), (-88.723880496, 7.72173913))
            ThreePointArc((-88.723880496, 7.72173913), (-88.359401208, 8.212938845), (-87.777052142, 8.4))
            Line((-87.777052142, 8.4), (-78.4, 8.4))
            ThreePointArc((-78.4, 8.4), (-75.571572875, 9.571572875), (-74.4, 12.4))
            Line((-74.4, 12.4), (-74.4, 21.777052142))
            ThreePointArc((-74.4, 21.777052142), (-74.212938845, 22.359401208), (-73.72173913, 22.723880496))
            ThreePointArc((-73.72173913, 22.723880496), (-66, 24), (-58.27826087, 22.723880496))
            ThreePointArc((-58.27826087, 22.723880496), (-57.787061155, 22.359401208), (-57.6, 21.777052142))
            Line((-57.6, 21.777052142), (-57.6, 12.4))
            ThreePointArc((-57.6, 12.4), (-56.428427125, 9.571572875), (-53.6, 8.4))
            Line((-53.6, 8.4), (-44.222947858, 8.4))
            ThreePointArc((-44.222947858, 8.4), (-43.640598792, 8.212938845), (-43.276119504, 7.72173913))
            ThreePointArc((-43.276119504, 7.72173913), (-42, 0), (-43.276119504, -7.72173913))
            ThreePointArc((-43.276119504, -7.72173913), (-43.640598792, -8.212938845), (-44.222947858, -8.4))
            Line((-44.222947858, -8.4), (-53.6, -8.4))
            ThreePointArc((-53.6, -8.4), (-56.428427125, -9.571572875), (-57.6, -12.4))
            Line((-57.6, -12.4), (-57.6, -21.777052142))
            ThreePointArc((-57.6, -21.777052142), (-57.787061155, -22.359401208), (-58.27826087, -22.723880496))
        make_face(mode=Mode.SUBTRACT)
    extrude(amount=MIRROR3_DEPTH)

    # Mirror3 2 outline → Mirror3 2 (add)
    with BuildSketch(Plane.XY.offset(MIRROR3_START)):
        with BuildLine():
            ThreePointArc((74.212938845, 29.892267153), (97, 0), (74.212938845, -29.892267153))
            Line((74.212938845, -29.892267153), (74.212938845, -34.022751734))
            ThreePointArc((74.212938845, -34.022751734), (101, 0), (74.212938845, 34.022751734))
            Line((74.212938845, 34.022751734), (74.212938845, 29.892267153))
        make_face()
        with BuildLine():
            ThreePointArc((66, -35), (70.135437663, -34.754829238), (74.212938845, -34.022751734))
            Line((74.212938845, -34.022751734), (57.787061155, -34.022751734))
            Line((57.787061155, -34.022751734), (57.787061155, -29.892267153))
            ThreePointArc((57.787061155, -29.892267153), (35, 0), (57.787061155, 29.892267153))
            Line((57.787061155, 29.892267153), (57.787061155, 34.022751734))
            Line((57.787061155, 34.022751734), (74.212938845, 34.022751734))
            ThreePointArc((74.212938845, 34.022751734), (70.135437663, 34.754829238), (66, 35))
            Line((66, 35), (-66, 35))
            ThreePointArc((-66, 35), (-70.135437663, 34.754829238), (-74.212938845, 34.022751734))
            Line((-74.212938845, 34.022751734), (-57.787061155, 34.022751734))
            Line((-57.787061155, 34.022751734), (-57.787061155, 29.892267153))
            ThreePointArc((-57.787061155, 29.892267153), (-35, 0), (-57.787061155, -29.892267153))
            Line((-57.787061155, -29.892267153), (-57.787061155, -34.022751734))
            Line((-57.787061155, -34.022751734), (-74.212938845, -34.022751734))
            ThreePointArc((-74.212938845, -34.022751734), (-70.135437663, -34.754829238), (-66, -35))
            Line((-66, -35), (66, -35))
        make_face()
        with BuildLine():
            ThreePointArc((-74.212938845, 34.022751734), (-101, 0), (-74.212938845, -34.022751734))
            Line((-74.212938845, -34.022751734), (-74.212938845, -29.892267153))
            ThreePointArc((-74.212938845, -29.892267153), (-97, 0), (-74.212938845, 29.892267153))
            Line((-74.212938845, 29.892267153), (-74.212938845, 34.022751734))
        make_face()
    extrude(amount=MIRROR3_2_DEPTH)


with BuildPart() as body_2:
    # Sketch2 → Boss-Extrude2 (new, two sides: drawn at the far end of the back side and taken through both)
    with BuildSketch(Plane(origin=(0, 0, 0), x_dir=(1, 0, 0), z_dir=(0, 1, 0)).offset(-BOSS_EXTRUDE2_DEPTH_BACK)):
        with Locations(Location((0, 31, 0), (0, 0, 270))):
            Circle(SKETCH2_R)
    extrude(amount=BOSS_EXTRUDE2_DEPTH + BOSS_EXTRUDE2_DEPTH_BACK)

    # Sketch6 → Cut-Extrude2 (cut, through all)
    with BuildSketch(Plane(origin=(0, 35, 0), x_dir=(1, 0, 0), z_dir=(0, 1, 0))):
        with Locations(Location((0, 31, 0), (0, 0, 270))):
            Circle(SKETCH6_R)
    extrude(amount=-CUT_EXTRUDE2_DEPTH, mode=Mode.SUBTRACT)


with BuildPart() as body_2_1:
    # Scale1: scaled about (0, 0, 0)
    add(body_2.part.scale(SCALE1_SCALE))


with BuildPart() as part_1:
    # Scale1: scaled about (0, 0, 0)
    add(part.part.scale(SCALE1_SCALE))


solid = Compound([body_2_1.part, part_1.part])
